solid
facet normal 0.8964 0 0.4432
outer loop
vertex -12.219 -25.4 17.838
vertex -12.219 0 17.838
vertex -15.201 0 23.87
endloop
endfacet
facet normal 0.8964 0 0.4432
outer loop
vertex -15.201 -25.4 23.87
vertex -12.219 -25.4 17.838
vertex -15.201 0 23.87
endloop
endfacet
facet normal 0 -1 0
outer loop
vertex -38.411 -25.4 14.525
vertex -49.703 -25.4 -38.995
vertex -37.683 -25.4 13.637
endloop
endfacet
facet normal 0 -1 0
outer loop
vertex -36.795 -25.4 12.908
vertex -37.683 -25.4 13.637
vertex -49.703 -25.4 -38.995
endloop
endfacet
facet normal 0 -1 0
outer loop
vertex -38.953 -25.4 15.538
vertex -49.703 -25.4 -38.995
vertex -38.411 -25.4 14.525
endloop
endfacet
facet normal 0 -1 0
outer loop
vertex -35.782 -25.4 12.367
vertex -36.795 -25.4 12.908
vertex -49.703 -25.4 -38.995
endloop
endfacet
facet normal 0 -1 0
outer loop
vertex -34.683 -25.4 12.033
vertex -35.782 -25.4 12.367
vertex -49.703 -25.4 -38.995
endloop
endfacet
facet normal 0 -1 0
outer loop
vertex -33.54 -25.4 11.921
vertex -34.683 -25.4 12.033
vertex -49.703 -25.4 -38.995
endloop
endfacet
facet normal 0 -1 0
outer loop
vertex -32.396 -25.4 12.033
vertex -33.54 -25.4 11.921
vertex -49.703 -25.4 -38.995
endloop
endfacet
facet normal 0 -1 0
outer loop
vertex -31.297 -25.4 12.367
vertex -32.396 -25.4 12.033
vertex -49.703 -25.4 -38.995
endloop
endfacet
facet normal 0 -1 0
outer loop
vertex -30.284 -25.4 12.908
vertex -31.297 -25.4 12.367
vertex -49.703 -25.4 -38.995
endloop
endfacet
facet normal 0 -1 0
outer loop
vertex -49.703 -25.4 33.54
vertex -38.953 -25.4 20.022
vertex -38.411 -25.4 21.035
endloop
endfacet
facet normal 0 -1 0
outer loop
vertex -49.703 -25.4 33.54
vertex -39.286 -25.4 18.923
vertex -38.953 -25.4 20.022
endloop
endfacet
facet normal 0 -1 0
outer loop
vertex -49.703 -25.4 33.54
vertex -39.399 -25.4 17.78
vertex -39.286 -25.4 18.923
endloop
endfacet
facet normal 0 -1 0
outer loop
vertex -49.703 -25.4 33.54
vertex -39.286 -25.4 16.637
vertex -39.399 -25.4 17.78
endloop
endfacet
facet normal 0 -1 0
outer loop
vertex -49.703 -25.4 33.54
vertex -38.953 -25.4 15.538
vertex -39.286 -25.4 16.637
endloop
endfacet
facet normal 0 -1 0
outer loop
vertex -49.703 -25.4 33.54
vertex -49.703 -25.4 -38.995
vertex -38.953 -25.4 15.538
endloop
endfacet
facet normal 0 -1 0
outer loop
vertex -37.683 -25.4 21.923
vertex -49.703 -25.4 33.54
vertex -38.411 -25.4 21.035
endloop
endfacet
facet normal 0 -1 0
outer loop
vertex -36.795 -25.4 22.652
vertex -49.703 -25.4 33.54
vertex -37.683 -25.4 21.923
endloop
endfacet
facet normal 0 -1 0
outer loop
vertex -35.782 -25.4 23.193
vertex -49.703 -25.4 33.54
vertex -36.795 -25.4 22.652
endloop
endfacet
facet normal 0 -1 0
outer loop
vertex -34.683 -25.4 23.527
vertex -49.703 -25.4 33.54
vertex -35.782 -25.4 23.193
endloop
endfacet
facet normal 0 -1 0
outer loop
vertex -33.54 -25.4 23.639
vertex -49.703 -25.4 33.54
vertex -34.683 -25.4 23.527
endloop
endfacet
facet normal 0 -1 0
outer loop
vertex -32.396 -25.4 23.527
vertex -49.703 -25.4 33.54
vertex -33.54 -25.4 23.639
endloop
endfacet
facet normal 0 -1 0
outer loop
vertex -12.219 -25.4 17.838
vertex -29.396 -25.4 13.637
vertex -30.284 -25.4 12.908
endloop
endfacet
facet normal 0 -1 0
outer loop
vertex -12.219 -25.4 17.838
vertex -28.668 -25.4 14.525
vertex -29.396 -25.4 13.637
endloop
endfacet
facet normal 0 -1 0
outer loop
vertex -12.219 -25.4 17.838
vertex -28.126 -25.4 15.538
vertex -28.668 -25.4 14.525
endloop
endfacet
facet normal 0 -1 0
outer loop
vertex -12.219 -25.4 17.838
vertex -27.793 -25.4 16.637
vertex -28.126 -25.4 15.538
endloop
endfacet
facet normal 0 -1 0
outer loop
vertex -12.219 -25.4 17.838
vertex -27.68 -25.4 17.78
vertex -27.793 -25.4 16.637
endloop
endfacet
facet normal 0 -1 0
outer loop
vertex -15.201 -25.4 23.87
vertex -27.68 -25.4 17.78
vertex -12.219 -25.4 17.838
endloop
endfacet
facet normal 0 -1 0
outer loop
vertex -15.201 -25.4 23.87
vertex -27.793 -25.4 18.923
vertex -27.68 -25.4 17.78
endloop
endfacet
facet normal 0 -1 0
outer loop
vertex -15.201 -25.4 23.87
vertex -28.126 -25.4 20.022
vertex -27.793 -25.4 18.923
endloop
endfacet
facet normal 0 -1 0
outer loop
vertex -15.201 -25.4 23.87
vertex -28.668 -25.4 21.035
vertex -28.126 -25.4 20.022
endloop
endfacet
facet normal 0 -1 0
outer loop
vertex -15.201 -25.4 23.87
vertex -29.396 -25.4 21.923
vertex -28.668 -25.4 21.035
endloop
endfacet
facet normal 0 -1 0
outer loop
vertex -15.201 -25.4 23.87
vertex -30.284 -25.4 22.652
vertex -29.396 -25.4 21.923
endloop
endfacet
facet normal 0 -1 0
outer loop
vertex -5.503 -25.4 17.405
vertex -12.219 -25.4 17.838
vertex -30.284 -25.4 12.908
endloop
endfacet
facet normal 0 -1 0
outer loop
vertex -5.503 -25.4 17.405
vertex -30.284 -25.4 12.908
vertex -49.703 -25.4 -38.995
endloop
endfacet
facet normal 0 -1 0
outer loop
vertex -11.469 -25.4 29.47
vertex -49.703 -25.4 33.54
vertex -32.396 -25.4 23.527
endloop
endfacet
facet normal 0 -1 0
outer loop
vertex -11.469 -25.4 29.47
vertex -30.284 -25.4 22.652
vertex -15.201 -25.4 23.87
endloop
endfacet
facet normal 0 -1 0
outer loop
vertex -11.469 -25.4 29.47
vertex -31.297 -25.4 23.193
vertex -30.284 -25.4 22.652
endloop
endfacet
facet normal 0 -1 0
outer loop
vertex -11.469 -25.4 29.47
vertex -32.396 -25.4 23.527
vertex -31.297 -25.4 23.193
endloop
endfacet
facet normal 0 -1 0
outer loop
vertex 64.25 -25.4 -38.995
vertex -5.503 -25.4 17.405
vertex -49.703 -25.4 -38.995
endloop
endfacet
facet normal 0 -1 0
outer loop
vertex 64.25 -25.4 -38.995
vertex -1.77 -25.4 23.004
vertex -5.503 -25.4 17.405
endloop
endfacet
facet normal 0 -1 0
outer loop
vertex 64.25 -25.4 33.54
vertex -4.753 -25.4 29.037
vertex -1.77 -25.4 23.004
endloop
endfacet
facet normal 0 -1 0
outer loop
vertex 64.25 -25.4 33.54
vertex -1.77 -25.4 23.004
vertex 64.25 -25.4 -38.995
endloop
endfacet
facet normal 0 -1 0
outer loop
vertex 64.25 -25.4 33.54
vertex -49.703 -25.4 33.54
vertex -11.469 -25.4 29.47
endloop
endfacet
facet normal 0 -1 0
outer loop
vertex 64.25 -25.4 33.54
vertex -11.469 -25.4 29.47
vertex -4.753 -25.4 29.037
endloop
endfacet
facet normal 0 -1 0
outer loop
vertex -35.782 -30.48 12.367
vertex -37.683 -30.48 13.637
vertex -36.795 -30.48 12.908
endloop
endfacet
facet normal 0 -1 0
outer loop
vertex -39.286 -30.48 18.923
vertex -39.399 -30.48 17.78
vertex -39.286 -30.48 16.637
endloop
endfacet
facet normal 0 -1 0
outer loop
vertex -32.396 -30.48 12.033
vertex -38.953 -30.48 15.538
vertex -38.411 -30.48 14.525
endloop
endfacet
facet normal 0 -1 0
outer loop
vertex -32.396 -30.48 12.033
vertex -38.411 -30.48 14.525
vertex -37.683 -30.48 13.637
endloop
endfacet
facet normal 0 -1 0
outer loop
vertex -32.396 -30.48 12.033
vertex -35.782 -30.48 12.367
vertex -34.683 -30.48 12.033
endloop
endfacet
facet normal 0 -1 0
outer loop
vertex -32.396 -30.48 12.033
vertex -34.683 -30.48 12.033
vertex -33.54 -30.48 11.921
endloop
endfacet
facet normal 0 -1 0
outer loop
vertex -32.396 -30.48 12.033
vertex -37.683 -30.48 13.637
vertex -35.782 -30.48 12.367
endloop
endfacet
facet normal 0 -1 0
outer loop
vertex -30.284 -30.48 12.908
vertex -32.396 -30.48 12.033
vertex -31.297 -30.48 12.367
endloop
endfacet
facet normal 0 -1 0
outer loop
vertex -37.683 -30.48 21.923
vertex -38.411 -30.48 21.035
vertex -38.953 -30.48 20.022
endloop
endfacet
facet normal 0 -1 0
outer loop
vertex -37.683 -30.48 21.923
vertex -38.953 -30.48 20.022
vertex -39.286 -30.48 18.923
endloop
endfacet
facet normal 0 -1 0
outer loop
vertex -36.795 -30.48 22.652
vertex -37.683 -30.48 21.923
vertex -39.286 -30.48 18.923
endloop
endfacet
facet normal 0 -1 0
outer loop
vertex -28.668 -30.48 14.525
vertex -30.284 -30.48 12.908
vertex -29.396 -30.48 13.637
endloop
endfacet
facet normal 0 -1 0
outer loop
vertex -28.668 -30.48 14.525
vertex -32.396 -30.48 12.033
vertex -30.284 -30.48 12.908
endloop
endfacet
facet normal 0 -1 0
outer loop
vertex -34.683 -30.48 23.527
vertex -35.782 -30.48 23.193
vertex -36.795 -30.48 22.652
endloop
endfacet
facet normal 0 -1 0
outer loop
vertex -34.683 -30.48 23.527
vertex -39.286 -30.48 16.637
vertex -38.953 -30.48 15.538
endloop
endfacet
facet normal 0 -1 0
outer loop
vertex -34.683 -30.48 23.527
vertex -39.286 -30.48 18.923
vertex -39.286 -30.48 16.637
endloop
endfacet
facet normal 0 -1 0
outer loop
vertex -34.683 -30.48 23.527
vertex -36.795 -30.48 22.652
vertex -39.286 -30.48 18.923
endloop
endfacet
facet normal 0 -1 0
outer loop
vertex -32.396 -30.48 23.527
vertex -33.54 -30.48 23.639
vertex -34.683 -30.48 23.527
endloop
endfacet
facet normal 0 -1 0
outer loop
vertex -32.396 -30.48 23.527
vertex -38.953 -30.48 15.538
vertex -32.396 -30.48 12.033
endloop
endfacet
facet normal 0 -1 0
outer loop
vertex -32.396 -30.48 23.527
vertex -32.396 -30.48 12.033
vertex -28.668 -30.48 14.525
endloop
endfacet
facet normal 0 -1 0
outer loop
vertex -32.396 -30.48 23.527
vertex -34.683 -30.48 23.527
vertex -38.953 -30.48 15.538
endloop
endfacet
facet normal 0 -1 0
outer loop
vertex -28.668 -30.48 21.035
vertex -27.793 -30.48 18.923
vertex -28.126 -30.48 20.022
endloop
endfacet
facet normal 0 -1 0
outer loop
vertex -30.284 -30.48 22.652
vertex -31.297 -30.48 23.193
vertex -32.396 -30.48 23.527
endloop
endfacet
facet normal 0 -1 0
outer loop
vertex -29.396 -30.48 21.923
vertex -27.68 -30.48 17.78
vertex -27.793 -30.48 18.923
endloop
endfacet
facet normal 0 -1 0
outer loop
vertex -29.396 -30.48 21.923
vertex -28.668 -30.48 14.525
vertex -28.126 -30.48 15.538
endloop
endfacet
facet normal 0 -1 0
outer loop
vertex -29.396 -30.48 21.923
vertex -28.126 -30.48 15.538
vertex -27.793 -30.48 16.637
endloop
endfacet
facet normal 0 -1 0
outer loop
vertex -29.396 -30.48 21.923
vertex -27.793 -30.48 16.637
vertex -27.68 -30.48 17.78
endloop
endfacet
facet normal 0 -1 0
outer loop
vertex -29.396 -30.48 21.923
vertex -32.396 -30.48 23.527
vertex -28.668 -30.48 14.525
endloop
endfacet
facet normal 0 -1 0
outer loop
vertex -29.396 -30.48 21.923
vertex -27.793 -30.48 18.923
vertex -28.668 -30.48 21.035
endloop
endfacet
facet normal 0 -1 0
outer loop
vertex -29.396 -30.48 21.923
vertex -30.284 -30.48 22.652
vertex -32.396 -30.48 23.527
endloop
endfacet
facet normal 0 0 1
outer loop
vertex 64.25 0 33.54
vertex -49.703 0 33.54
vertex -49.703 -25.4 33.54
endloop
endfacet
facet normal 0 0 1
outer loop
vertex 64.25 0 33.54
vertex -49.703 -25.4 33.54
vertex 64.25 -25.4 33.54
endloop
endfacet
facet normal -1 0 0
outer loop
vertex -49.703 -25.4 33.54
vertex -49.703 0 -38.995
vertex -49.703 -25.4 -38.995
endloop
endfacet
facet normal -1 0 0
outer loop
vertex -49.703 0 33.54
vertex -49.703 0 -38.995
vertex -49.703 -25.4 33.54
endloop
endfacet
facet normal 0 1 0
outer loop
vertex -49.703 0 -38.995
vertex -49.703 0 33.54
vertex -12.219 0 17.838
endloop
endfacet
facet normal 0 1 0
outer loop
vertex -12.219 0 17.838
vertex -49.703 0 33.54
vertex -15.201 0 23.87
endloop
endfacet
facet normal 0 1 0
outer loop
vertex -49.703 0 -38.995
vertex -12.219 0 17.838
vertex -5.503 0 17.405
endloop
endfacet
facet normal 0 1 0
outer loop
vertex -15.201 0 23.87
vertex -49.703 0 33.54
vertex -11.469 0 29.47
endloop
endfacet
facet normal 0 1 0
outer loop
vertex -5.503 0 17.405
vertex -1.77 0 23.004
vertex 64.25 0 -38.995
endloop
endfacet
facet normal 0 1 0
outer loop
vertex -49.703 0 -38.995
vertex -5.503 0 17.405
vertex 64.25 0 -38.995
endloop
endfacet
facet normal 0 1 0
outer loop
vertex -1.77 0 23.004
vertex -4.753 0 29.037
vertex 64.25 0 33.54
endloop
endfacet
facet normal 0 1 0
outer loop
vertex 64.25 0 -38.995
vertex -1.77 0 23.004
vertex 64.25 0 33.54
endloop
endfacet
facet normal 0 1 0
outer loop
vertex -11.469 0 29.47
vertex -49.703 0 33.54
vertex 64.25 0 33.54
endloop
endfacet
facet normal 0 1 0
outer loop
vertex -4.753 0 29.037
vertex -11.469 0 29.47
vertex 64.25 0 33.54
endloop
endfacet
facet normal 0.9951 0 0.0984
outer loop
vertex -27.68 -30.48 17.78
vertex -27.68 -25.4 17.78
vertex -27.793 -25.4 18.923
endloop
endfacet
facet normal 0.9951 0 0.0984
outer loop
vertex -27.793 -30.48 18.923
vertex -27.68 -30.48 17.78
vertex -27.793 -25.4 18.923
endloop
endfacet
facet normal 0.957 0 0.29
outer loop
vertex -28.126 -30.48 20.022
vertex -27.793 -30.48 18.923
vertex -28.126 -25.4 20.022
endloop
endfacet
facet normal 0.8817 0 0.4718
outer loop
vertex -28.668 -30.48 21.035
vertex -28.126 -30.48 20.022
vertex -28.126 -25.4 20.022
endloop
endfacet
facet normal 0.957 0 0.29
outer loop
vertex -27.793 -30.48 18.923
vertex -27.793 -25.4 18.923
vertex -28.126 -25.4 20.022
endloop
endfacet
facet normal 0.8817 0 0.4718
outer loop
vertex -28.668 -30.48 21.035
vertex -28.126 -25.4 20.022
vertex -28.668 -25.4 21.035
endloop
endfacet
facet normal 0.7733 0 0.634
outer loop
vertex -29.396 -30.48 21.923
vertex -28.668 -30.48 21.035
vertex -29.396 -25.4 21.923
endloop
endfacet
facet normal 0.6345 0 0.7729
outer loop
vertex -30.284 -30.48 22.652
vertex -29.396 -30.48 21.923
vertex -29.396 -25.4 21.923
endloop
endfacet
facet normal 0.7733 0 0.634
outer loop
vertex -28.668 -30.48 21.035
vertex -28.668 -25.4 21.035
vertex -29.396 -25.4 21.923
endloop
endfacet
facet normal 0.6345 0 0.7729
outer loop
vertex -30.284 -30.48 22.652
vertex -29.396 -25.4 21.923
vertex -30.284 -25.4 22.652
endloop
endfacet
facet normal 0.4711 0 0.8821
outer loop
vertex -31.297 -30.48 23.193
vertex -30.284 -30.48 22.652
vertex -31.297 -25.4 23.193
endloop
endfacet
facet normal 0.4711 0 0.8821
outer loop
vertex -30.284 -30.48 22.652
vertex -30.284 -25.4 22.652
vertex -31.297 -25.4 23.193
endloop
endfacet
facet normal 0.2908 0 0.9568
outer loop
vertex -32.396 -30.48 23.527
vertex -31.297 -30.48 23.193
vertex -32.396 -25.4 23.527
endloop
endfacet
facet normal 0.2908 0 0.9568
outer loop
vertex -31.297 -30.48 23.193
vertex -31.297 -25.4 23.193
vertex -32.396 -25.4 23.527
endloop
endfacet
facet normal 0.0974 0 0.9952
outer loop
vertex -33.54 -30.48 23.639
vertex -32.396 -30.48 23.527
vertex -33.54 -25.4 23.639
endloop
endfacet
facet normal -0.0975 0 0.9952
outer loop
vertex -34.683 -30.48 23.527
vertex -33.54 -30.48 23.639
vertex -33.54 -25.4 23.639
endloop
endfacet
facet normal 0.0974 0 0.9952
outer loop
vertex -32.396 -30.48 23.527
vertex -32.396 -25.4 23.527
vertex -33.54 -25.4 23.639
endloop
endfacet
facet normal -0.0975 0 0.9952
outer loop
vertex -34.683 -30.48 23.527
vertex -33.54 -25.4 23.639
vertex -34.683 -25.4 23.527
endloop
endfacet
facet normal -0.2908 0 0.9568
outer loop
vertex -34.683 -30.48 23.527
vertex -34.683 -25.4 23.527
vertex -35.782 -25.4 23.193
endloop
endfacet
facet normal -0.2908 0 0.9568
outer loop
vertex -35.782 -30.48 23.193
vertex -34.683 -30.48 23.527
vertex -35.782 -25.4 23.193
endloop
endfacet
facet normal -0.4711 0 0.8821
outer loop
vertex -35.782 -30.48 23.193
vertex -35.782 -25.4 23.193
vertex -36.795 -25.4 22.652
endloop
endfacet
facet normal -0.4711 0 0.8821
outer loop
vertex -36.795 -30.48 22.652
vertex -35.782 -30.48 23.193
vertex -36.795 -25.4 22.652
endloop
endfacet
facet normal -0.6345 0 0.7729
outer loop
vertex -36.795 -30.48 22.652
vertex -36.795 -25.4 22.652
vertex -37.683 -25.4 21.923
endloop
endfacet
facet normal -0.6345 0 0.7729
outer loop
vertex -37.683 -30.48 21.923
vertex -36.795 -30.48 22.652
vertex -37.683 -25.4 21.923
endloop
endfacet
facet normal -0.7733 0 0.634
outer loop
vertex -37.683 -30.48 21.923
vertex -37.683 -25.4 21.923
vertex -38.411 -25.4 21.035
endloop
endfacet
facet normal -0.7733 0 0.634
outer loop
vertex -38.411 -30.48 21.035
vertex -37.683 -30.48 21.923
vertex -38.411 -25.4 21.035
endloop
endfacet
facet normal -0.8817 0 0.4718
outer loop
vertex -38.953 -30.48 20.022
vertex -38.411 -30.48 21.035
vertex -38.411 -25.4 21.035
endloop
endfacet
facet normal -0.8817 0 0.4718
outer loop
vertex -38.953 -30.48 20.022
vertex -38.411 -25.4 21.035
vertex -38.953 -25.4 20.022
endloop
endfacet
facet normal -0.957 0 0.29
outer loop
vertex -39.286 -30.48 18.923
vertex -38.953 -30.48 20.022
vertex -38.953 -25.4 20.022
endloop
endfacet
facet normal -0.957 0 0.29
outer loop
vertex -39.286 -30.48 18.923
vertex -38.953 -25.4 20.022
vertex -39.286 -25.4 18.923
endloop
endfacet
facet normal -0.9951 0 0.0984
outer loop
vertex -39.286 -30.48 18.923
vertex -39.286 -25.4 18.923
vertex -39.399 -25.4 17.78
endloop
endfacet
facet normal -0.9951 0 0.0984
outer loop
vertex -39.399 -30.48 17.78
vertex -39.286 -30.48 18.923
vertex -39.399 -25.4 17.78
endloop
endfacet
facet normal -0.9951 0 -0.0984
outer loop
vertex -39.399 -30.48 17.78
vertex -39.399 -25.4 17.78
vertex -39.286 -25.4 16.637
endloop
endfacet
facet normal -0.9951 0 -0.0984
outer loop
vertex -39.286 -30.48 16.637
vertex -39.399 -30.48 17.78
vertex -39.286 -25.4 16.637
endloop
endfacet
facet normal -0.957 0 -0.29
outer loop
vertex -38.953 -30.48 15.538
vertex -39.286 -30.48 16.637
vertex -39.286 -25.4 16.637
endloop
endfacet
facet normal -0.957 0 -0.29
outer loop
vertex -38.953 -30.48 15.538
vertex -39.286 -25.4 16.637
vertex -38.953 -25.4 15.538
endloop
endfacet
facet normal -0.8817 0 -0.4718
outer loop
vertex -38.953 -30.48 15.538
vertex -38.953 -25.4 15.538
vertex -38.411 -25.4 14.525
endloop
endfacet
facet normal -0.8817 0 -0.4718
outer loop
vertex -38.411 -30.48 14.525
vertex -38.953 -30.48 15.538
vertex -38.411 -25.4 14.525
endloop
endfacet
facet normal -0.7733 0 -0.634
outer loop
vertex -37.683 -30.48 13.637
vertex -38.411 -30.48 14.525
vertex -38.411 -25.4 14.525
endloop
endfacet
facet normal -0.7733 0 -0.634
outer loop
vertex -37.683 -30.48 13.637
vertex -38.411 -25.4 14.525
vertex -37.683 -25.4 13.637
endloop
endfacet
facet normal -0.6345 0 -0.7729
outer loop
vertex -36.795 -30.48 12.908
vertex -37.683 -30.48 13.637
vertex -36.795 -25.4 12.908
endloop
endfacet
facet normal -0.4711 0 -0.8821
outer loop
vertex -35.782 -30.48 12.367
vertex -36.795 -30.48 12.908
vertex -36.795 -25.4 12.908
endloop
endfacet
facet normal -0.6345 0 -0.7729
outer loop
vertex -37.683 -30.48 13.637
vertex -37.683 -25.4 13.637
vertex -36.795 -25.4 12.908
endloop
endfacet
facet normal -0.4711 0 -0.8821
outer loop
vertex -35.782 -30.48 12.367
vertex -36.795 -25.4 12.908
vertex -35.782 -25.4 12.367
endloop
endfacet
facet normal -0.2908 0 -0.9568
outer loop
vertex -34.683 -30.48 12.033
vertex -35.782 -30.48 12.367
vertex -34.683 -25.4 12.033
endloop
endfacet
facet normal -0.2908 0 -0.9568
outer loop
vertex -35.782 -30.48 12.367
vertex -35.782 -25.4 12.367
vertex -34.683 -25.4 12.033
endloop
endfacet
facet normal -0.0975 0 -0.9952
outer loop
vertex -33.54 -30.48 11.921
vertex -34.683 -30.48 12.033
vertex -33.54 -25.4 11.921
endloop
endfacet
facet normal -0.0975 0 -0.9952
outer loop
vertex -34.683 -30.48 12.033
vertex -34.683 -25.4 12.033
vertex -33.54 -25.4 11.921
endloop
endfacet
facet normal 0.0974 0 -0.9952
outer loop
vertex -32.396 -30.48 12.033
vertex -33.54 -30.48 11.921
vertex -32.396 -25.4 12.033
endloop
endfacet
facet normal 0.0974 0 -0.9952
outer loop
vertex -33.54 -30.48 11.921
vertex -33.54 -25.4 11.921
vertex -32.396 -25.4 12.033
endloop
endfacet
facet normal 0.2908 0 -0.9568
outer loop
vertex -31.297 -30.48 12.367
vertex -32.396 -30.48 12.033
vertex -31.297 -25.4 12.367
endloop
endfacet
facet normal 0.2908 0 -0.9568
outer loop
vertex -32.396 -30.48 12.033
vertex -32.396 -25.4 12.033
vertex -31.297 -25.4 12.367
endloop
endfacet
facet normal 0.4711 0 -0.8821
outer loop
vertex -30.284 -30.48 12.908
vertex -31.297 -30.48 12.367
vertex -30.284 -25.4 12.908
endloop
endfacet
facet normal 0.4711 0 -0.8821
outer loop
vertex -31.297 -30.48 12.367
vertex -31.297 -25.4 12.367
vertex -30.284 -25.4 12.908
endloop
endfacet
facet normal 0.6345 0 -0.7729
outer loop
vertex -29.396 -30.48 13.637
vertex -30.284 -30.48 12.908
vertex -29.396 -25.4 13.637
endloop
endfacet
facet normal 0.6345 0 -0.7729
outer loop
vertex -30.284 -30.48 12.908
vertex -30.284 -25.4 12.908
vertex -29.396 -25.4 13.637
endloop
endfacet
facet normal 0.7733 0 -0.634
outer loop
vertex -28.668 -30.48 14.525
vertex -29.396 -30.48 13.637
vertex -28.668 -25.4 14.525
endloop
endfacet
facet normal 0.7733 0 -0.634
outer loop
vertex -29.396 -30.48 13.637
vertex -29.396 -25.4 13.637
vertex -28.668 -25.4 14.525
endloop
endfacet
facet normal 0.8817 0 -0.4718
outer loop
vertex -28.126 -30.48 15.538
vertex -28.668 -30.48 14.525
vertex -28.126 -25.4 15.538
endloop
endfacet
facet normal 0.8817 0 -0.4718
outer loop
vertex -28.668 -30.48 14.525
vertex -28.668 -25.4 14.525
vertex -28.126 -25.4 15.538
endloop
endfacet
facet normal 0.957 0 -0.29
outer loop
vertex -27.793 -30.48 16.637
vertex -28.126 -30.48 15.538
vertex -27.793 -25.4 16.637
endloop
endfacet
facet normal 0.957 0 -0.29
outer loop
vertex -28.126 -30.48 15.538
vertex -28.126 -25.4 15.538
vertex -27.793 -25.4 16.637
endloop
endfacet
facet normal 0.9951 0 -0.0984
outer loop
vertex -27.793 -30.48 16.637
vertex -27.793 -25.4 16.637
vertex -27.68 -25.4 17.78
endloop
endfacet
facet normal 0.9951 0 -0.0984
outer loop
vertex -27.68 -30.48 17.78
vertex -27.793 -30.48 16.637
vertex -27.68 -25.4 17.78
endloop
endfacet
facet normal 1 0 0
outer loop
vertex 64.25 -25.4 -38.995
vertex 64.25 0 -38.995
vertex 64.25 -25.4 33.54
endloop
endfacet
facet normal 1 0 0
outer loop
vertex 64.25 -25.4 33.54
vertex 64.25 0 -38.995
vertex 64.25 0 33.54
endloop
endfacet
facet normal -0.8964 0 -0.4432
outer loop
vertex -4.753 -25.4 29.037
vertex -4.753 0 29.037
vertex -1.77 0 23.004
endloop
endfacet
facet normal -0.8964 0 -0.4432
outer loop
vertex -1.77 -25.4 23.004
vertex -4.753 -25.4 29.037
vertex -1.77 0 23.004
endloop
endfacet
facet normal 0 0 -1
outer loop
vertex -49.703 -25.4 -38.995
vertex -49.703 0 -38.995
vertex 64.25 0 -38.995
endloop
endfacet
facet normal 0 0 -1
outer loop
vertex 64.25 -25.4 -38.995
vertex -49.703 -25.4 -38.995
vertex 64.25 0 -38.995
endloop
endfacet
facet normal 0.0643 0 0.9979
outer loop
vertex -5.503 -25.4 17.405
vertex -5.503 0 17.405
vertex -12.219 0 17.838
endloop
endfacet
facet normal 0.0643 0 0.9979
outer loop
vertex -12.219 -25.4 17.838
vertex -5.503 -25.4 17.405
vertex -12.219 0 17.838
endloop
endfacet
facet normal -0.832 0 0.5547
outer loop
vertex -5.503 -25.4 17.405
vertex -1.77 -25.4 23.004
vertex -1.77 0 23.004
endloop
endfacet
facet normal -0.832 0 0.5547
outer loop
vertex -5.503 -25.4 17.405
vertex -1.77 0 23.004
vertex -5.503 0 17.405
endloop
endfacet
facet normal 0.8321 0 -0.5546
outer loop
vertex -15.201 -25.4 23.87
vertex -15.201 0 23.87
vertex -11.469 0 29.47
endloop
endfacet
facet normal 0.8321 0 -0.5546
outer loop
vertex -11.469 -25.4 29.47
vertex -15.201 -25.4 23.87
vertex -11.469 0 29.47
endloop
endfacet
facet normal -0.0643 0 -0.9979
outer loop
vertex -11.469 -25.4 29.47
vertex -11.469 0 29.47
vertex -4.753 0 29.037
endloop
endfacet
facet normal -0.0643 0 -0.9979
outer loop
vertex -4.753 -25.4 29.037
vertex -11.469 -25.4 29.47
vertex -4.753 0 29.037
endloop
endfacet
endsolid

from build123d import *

# Parameters (mm, degrees)
F0_W     = 113.953635
F0_H     = 72.534319
F0_R     = 5.859318
F1_DEPTH = 25.4
F2_DEPTH = 30.48


with BuildPart() as f1:
    # F0 (on Front) → F1 (new body)
    with BuildSketch(Plane.XZ):
        with Locations((7.273636, -2.727615)):
            Rectangle(F0_W, F0_H)
        with Locations((-33.539545, 17.78)):
            Circle(F0_R, mode=Mode.SUBTRACT)
        Polygon((-4.753076, 29.036522), (-1.770401, 23.004169), (-5.503234, 17.40492), (-12.218743, 17.838024), (-15.201418, 23.870377), (-11.468585, 29.469626), align=None, mode=Mode.SUBTRACT)
    extrude(amount=F1_DEPTH)

    # F0 (on Front) → F2 (join)
    with BuildSketch(Plane.XZ):
        with Locations((-33.539545, 17.78)):
            Circle(F0_R)
    extrude(amount=F2_DEPTH)


solid = f1.part
